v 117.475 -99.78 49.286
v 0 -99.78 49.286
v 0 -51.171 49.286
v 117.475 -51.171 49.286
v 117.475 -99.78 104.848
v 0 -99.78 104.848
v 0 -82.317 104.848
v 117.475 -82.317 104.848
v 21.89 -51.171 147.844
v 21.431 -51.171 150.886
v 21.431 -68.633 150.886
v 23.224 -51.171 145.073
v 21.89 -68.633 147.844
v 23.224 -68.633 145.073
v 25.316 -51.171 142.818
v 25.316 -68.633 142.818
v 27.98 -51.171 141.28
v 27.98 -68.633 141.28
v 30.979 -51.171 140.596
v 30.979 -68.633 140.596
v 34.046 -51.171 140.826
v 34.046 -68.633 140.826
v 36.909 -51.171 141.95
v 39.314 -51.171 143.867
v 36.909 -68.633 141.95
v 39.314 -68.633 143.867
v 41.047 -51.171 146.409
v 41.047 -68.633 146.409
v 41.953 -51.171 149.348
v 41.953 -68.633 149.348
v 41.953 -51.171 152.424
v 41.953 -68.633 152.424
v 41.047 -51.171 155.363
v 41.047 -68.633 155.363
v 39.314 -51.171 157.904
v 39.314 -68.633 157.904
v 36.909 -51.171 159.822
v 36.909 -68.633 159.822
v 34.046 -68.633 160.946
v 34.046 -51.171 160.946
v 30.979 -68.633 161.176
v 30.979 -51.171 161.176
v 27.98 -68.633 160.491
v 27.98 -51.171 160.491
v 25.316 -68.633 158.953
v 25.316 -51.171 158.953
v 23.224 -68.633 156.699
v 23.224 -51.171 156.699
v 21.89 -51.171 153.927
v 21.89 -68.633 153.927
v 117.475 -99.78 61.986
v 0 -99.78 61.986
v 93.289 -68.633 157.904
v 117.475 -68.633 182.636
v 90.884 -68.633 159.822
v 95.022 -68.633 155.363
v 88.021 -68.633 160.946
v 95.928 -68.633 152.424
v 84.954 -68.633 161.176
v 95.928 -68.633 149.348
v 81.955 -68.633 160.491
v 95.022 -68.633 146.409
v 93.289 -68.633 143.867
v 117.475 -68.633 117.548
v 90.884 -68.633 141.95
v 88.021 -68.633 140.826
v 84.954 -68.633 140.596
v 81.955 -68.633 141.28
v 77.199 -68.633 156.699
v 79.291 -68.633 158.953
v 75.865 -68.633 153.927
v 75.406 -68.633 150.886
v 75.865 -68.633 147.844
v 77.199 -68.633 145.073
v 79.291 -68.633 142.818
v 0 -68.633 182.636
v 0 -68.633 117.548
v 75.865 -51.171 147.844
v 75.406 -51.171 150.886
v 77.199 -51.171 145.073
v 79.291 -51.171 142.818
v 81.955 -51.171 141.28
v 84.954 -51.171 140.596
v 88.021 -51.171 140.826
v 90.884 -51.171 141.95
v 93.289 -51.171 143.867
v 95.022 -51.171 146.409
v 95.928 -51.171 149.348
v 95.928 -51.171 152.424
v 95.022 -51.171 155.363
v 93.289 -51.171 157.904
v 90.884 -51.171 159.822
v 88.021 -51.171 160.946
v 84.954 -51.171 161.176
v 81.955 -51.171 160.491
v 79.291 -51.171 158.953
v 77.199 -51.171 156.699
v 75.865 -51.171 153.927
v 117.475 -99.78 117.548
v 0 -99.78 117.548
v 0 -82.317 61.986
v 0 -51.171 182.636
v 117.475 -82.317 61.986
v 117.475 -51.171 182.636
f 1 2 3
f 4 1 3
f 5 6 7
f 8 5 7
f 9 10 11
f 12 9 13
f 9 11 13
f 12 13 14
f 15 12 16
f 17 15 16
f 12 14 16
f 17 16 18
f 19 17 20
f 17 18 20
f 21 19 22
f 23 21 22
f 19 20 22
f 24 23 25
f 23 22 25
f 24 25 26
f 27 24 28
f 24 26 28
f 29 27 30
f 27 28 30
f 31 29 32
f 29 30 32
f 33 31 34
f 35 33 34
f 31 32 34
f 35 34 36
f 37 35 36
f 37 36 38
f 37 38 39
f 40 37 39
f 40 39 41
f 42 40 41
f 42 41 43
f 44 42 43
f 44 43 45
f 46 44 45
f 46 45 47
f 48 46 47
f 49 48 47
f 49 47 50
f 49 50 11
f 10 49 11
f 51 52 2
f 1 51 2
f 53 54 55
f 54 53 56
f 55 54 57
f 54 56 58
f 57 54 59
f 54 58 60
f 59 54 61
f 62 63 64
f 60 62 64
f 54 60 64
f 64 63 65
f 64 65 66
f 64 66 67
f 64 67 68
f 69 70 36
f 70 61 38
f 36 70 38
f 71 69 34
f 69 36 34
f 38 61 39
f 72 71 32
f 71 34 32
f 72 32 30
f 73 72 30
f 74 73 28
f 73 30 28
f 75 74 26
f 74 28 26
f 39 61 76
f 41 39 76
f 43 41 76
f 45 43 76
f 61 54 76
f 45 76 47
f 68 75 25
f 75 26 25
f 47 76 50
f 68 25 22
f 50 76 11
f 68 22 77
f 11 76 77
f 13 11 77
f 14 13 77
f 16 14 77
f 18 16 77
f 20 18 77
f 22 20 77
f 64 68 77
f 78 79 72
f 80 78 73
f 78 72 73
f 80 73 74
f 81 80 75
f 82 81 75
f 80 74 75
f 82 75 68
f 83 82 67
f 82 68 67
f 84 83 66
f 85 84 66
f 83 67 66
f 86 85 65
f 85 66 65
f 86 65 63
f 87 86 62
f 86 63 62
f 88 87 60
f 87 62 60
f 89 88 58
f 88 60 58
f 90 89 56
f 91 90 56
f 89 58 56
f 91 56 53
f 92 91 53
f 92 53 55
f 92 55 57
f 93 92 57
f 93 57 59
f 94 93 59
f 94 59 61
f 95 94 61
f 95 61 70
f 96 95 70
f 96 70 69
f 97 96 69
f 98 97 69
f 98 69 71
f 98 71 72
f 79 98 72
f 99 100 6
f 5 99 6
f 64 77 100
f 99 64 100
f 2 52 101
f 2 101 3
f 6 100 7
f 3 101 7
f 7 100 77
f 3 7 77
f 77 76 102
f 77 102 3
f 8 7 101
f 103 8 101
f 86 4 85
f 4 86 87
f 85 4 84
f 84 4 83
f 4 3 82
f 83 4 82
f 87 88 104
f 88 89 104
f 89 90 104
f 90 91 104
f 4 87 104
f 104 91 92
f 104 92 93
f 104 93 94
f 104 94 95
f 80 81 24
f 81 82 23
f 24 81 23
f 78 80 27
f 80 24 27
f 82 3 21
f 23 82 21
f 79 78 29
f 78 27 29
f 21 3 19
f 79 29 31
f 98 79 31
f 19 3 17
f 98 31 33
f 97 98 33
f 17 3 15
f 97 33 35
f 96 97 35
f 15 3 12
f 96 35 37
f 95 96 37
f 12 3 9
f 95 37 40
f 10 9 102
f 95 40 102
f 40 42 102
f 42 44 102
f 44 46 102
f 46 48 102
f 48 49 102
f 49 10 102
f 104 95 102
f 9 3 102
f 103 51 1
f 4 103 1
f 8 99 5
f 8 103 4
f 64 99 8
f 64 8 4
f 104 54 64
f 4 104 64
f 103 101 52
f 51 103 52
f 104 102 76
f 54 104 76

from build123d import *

# Parameters (mm, degrees)
F1_DEPTH = 117.475
F3_D     = 20.6375


# Not quite as in the source:
# - a length typed as a fraction of an inch, garbled in the dataset ("3 / 203.2 mm" for 3/8 in), is restored


with BuildPart() as f1:
    # F0 (on Right) → F1 (new body)
    with BuildSketch(Plane.YZ):
        Polygon((-51.1705551147, 49.2858837724), (-51.1705551147, 182.6358837724), (-68.6330551147, 182.6358837724), (-68.6330551147, 117.5483837724), (-68.6330551147, 49.2858837724), align=None)
        Polygon((-99.7797900677, 49.2858837724), (-68.6330551147, 49.2858837724), (-68.6330551147, 117.5483837724), (-99.7797900677, 117.5483837724), (-99.7797900677, 104.8483837724), (-82.3172900677, 104.8483837724), (-82.3172900677, 61.9858837724), (-99.7797900677, 61.9858837724), align=None)
    extrude(amount=F1_DEPTH)

    # F3 (through all)
    with Locations(Plane(origin=(0, 0, 0), x_dir=(1, 0, 0), z_dir=(0, 1, 0))):
        with Locations((31.75, -150.8858837724), (85.725, -150.8858837724)):
            Hole(F3_D / 2)


solid = f1.part
